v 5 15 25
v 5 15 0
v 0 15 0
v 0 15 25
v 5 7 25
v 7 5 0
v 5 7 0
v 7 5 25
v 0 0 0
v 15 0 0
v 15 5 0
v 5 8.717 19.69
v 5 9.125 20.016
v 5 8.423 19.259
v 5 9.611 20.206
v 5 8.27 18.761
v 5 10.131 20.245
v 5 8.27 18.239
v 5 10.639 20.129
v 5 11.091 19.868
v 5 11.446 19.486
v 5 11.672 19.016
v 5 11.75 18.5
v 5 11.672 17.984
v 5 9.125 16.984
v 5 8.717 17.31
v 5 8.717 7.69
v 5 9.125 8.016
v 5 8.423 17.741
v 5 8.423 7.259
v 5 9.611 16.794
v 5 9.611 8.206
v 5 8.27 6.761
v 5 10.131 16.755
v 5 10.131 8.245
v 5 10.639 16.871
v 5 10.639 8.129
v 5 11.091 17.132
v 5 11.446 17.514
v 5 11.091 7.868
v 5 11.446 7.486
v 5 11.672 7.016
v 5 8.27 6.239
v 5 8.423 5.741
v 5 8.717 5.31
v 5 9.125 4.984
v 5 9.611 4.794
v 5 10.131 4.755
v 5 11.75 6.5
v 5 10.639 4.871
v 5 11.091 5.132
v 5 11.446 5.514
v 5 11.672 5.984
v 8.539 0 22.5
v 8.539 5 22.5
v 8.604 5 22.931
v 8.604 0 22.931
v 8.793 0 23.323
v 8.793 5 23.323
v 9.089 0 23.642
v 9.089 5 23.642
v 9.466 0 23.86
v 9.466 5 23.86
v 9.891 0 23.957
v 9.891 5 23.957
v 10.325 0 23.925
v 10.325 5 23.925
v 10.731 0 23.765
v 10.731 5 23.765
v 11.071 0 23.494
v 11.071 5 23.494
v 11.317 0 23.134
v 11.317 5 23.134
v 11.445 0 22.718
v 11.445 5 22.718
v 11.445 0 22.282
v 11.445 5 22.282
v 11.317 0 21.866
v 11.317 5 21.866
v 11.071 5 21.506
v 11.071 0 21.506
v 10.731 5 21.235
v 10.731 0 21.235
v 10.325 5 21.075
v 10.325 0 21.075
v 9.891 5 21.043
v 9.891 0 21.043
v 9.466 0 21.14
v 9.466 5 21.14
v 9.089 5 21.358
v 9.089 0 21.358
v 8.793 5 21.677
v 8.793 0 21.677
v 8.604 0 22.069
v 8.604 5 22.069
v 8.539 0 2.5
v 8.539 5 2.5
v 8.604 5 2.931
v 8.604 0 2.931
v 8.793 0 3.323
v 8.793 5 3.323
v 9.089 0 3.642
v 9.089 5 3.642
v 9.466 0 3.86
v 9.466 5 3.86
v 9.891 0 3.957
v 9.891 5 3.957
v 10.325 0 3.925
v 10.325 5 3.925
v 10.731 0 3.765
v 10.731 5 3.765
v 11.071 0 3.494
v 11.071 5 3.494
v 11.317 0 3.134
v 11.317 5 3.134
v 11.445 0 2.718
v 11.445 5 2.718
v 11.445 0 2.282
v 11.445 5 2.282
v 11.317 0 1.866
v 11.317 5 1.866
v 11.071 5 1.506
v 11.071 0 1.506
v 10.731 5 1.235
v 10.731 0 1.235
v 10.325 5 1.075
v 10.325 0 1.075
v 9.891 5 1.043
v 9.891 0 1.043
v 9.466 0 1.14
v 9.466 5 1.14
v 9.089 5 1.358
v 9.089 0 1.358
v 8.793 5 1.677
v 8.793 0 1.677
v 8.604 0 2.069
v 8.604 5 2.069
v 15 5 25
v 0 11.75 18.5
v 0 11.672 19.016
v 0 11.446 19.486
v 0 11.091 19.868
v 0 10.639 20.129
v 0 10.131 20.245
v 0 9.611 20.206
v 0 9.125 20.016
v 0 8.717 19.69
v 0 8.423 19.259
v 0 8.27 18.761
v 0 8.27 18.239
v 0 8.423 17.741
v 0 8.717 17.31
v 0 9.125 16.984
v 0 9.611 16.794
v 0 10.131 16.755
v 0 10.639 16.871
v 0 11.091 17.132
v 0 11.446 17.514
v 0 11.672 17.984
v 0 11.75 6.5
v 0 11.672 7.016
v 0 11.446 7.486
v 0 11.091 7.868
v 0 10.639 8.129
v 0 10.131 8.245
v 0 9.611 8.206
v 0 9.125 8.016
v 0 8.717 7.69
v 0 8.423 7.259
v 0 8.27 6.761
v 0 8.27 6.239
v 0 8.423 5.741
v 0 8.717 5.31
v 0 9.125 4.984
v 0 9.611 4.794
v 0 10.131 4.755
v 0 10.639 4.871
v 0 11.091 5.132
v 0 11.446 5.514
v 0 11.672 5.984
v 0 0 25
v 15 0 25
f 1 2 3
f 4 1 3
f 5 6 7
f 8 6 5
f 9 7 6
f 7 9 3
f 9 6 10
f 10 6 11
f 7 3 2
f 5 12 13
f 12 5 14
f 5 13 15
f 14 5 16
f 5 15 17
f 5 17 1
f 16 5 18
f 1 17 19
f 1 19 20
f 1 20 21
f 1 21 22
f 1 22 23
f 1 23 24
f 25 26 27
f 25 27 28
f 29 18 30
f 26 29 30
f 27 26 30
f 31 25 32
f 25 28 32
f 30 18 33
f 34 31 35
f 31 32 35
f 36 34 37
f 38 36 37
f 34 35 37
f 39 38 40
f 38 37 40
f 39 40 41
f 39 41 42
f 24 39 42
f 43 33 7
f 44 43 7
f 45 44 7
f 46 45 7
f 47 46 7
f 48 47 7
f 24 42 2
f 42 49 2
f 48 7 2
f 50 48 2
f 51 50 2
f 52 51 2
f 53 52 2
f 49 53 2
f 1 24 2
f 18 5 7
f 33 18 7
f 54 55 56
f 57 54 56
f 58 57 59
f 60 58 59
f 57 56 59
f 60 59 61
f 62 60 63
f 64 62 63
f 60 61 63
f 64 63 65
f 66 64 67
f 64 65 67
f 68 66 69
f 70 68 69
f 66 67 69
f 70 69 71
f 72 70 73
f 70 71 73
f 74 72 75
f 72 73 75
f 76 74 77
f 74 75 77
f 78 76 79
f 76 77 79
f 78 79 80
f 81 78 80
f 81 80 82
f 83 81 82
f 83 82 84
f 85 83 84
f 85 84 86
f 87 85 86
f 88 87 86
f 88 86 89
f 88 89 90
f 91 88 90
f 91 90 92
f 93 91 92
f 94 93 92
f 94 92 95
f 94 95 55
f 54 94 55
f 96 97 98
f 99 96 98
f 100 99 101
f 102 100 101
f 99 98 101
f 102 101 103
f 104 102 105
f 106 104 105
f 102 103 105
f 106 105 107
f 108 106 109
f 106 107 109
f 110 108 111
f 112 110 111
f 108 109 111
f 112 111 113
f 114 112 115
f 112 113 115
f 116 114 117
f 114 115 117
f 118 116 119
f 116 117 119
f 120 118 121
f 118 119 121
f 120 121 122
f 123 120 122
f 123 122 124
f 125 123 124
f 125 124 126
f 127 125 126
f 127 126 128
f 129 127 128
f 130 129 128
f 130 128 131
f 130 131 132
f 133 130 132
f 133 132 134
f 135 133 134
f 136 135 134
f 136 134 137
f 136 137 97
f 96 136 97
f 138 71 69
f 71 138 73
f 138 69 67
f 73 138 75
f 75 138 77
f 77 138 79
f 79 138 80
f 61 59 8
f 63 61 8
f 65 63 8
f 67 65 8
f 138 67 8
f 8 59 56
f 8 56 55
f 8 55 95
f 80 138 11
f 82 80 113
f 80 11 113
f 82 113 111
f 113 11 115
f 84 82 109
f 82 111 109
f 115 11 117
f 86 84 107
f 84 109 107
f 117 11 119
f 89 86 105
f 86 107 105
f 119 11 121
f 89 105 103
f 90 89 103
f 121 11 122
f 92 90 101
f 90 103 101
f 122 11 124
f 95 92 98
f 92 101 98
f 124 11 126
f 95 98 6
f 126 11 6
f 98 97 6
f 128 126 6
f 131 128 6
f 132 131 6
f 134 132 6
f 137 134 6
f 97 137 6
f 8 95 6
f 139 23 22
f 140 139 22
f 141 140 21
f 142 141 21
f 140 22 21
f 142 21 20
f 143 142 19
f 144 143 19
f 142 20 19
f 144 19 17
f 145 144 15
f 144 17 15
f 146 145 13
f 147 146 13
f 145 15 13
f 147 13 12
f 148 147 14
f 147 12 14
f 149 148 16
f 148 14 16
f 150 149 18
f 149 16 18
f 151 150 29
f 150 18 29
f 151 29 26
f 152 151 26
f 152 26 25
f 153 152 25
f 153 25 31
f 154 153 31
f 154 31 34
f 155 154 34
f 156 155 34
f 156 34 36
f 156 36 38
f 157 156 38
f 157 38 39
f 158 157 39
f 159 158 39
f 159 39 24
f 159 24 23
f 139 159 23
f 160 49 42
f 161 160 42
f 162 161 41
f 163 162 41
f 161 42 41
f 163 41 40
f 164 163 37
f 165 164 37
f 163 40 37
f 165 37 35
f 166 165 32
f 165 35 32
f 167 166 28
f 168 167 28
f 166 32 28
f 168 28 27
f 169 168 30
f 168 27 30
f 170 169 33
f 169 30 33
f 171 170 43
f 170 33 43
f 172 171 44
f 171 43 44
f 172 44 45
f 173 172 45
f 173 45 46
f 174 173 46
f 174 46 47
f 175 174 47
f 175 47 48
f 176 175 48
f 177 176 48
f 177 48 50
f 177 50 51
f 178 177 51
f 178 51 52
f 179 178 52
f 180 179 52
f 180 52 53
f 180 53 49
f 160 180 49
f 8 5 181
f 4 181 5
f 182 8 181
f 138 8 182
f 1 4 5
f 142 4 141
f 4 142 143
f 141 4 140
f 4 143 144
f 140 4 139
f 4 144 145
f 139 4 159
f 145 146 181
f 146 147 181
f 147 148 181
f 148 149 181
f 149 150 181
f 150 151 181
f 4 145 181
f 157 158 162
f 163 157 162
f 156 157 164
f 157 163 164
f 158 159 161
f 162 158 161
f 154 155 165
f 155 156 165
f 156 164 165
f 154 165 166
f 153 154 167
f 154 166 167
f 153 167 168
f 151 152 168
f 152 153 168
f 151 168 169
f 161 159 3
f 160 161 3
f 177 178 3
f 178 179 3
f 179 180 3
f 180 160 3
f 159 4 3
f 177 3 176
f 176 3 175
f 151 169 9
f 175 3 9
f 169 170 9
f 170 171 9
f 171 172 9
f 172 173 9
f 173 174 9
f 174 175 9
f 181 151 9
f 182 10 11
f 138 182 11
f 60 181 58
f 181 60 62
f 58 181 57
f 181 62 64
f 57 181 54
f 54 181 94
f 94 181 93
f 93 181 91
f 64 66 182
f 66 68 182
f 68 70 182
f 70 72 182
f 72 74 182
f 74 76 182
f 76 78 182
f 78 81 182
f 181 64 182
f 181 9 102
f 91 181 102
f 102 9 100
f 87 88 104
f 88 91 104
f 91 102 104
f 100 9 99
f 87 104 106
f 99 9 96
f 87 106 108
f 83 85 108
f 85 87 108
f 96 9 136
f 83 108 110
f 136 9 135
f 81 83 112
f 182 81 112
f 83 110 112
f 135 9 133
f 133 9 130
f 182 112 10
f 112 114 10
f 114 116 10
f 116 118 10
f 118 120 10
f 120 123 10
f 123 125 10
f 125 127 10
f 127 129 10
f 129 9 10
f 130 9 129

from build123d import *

# Parameters (mm, degrees)
F1_DEPTH = 25
F2_R     = 1.75
F3_DEPTH = 25
F4_R     = 1.461251
F5_DEPTH = 25
F6_SIZE  = 2


with BuildPart() as f1:
    # F0 (on Top) → F1 (new body)
    with BuildSketch(Plane.XY):
        Polygon((0, 15), (0, 0), (15, 0), (15, 5), (5, 5), (5, 15), align=None)
    extrude(amount=F1_DEPTH)

    # F2 (on face) → F3 (cut)
    with BuildSketch(Plane.YZ.offset(5)):
        with Locations((10, 6.5)):
            Circle(F2_R)
        with Locations((10, 18.5)):
            Circle(F2_R)
    extrude(amount=-F3_DEPTH, mode=Mode.SUBTRACT)

    # F4 (on face) → F5 (cut)
    with BuildSketch(Plane(origin=(0, 5, 0), x_dir=(-1, 0, 0), z_dir=(0, 1, 0))):
        with Locations((-10, 2.5)):
            Circle(F4_R)
        with Locations((-10, 22.5)):
            Circle(F4_R)
    extrude(amount=-F5_DEPTH, mode=Mode.SUBTRACT)

    # F6
    f6_edges = [f1.edges().sort_by_distance(p)[0] for p in [
        (5, 5, 12.5),
    ]]
    chamfer(f6_edges, length=F6_SIZE)


solid = f1.part
